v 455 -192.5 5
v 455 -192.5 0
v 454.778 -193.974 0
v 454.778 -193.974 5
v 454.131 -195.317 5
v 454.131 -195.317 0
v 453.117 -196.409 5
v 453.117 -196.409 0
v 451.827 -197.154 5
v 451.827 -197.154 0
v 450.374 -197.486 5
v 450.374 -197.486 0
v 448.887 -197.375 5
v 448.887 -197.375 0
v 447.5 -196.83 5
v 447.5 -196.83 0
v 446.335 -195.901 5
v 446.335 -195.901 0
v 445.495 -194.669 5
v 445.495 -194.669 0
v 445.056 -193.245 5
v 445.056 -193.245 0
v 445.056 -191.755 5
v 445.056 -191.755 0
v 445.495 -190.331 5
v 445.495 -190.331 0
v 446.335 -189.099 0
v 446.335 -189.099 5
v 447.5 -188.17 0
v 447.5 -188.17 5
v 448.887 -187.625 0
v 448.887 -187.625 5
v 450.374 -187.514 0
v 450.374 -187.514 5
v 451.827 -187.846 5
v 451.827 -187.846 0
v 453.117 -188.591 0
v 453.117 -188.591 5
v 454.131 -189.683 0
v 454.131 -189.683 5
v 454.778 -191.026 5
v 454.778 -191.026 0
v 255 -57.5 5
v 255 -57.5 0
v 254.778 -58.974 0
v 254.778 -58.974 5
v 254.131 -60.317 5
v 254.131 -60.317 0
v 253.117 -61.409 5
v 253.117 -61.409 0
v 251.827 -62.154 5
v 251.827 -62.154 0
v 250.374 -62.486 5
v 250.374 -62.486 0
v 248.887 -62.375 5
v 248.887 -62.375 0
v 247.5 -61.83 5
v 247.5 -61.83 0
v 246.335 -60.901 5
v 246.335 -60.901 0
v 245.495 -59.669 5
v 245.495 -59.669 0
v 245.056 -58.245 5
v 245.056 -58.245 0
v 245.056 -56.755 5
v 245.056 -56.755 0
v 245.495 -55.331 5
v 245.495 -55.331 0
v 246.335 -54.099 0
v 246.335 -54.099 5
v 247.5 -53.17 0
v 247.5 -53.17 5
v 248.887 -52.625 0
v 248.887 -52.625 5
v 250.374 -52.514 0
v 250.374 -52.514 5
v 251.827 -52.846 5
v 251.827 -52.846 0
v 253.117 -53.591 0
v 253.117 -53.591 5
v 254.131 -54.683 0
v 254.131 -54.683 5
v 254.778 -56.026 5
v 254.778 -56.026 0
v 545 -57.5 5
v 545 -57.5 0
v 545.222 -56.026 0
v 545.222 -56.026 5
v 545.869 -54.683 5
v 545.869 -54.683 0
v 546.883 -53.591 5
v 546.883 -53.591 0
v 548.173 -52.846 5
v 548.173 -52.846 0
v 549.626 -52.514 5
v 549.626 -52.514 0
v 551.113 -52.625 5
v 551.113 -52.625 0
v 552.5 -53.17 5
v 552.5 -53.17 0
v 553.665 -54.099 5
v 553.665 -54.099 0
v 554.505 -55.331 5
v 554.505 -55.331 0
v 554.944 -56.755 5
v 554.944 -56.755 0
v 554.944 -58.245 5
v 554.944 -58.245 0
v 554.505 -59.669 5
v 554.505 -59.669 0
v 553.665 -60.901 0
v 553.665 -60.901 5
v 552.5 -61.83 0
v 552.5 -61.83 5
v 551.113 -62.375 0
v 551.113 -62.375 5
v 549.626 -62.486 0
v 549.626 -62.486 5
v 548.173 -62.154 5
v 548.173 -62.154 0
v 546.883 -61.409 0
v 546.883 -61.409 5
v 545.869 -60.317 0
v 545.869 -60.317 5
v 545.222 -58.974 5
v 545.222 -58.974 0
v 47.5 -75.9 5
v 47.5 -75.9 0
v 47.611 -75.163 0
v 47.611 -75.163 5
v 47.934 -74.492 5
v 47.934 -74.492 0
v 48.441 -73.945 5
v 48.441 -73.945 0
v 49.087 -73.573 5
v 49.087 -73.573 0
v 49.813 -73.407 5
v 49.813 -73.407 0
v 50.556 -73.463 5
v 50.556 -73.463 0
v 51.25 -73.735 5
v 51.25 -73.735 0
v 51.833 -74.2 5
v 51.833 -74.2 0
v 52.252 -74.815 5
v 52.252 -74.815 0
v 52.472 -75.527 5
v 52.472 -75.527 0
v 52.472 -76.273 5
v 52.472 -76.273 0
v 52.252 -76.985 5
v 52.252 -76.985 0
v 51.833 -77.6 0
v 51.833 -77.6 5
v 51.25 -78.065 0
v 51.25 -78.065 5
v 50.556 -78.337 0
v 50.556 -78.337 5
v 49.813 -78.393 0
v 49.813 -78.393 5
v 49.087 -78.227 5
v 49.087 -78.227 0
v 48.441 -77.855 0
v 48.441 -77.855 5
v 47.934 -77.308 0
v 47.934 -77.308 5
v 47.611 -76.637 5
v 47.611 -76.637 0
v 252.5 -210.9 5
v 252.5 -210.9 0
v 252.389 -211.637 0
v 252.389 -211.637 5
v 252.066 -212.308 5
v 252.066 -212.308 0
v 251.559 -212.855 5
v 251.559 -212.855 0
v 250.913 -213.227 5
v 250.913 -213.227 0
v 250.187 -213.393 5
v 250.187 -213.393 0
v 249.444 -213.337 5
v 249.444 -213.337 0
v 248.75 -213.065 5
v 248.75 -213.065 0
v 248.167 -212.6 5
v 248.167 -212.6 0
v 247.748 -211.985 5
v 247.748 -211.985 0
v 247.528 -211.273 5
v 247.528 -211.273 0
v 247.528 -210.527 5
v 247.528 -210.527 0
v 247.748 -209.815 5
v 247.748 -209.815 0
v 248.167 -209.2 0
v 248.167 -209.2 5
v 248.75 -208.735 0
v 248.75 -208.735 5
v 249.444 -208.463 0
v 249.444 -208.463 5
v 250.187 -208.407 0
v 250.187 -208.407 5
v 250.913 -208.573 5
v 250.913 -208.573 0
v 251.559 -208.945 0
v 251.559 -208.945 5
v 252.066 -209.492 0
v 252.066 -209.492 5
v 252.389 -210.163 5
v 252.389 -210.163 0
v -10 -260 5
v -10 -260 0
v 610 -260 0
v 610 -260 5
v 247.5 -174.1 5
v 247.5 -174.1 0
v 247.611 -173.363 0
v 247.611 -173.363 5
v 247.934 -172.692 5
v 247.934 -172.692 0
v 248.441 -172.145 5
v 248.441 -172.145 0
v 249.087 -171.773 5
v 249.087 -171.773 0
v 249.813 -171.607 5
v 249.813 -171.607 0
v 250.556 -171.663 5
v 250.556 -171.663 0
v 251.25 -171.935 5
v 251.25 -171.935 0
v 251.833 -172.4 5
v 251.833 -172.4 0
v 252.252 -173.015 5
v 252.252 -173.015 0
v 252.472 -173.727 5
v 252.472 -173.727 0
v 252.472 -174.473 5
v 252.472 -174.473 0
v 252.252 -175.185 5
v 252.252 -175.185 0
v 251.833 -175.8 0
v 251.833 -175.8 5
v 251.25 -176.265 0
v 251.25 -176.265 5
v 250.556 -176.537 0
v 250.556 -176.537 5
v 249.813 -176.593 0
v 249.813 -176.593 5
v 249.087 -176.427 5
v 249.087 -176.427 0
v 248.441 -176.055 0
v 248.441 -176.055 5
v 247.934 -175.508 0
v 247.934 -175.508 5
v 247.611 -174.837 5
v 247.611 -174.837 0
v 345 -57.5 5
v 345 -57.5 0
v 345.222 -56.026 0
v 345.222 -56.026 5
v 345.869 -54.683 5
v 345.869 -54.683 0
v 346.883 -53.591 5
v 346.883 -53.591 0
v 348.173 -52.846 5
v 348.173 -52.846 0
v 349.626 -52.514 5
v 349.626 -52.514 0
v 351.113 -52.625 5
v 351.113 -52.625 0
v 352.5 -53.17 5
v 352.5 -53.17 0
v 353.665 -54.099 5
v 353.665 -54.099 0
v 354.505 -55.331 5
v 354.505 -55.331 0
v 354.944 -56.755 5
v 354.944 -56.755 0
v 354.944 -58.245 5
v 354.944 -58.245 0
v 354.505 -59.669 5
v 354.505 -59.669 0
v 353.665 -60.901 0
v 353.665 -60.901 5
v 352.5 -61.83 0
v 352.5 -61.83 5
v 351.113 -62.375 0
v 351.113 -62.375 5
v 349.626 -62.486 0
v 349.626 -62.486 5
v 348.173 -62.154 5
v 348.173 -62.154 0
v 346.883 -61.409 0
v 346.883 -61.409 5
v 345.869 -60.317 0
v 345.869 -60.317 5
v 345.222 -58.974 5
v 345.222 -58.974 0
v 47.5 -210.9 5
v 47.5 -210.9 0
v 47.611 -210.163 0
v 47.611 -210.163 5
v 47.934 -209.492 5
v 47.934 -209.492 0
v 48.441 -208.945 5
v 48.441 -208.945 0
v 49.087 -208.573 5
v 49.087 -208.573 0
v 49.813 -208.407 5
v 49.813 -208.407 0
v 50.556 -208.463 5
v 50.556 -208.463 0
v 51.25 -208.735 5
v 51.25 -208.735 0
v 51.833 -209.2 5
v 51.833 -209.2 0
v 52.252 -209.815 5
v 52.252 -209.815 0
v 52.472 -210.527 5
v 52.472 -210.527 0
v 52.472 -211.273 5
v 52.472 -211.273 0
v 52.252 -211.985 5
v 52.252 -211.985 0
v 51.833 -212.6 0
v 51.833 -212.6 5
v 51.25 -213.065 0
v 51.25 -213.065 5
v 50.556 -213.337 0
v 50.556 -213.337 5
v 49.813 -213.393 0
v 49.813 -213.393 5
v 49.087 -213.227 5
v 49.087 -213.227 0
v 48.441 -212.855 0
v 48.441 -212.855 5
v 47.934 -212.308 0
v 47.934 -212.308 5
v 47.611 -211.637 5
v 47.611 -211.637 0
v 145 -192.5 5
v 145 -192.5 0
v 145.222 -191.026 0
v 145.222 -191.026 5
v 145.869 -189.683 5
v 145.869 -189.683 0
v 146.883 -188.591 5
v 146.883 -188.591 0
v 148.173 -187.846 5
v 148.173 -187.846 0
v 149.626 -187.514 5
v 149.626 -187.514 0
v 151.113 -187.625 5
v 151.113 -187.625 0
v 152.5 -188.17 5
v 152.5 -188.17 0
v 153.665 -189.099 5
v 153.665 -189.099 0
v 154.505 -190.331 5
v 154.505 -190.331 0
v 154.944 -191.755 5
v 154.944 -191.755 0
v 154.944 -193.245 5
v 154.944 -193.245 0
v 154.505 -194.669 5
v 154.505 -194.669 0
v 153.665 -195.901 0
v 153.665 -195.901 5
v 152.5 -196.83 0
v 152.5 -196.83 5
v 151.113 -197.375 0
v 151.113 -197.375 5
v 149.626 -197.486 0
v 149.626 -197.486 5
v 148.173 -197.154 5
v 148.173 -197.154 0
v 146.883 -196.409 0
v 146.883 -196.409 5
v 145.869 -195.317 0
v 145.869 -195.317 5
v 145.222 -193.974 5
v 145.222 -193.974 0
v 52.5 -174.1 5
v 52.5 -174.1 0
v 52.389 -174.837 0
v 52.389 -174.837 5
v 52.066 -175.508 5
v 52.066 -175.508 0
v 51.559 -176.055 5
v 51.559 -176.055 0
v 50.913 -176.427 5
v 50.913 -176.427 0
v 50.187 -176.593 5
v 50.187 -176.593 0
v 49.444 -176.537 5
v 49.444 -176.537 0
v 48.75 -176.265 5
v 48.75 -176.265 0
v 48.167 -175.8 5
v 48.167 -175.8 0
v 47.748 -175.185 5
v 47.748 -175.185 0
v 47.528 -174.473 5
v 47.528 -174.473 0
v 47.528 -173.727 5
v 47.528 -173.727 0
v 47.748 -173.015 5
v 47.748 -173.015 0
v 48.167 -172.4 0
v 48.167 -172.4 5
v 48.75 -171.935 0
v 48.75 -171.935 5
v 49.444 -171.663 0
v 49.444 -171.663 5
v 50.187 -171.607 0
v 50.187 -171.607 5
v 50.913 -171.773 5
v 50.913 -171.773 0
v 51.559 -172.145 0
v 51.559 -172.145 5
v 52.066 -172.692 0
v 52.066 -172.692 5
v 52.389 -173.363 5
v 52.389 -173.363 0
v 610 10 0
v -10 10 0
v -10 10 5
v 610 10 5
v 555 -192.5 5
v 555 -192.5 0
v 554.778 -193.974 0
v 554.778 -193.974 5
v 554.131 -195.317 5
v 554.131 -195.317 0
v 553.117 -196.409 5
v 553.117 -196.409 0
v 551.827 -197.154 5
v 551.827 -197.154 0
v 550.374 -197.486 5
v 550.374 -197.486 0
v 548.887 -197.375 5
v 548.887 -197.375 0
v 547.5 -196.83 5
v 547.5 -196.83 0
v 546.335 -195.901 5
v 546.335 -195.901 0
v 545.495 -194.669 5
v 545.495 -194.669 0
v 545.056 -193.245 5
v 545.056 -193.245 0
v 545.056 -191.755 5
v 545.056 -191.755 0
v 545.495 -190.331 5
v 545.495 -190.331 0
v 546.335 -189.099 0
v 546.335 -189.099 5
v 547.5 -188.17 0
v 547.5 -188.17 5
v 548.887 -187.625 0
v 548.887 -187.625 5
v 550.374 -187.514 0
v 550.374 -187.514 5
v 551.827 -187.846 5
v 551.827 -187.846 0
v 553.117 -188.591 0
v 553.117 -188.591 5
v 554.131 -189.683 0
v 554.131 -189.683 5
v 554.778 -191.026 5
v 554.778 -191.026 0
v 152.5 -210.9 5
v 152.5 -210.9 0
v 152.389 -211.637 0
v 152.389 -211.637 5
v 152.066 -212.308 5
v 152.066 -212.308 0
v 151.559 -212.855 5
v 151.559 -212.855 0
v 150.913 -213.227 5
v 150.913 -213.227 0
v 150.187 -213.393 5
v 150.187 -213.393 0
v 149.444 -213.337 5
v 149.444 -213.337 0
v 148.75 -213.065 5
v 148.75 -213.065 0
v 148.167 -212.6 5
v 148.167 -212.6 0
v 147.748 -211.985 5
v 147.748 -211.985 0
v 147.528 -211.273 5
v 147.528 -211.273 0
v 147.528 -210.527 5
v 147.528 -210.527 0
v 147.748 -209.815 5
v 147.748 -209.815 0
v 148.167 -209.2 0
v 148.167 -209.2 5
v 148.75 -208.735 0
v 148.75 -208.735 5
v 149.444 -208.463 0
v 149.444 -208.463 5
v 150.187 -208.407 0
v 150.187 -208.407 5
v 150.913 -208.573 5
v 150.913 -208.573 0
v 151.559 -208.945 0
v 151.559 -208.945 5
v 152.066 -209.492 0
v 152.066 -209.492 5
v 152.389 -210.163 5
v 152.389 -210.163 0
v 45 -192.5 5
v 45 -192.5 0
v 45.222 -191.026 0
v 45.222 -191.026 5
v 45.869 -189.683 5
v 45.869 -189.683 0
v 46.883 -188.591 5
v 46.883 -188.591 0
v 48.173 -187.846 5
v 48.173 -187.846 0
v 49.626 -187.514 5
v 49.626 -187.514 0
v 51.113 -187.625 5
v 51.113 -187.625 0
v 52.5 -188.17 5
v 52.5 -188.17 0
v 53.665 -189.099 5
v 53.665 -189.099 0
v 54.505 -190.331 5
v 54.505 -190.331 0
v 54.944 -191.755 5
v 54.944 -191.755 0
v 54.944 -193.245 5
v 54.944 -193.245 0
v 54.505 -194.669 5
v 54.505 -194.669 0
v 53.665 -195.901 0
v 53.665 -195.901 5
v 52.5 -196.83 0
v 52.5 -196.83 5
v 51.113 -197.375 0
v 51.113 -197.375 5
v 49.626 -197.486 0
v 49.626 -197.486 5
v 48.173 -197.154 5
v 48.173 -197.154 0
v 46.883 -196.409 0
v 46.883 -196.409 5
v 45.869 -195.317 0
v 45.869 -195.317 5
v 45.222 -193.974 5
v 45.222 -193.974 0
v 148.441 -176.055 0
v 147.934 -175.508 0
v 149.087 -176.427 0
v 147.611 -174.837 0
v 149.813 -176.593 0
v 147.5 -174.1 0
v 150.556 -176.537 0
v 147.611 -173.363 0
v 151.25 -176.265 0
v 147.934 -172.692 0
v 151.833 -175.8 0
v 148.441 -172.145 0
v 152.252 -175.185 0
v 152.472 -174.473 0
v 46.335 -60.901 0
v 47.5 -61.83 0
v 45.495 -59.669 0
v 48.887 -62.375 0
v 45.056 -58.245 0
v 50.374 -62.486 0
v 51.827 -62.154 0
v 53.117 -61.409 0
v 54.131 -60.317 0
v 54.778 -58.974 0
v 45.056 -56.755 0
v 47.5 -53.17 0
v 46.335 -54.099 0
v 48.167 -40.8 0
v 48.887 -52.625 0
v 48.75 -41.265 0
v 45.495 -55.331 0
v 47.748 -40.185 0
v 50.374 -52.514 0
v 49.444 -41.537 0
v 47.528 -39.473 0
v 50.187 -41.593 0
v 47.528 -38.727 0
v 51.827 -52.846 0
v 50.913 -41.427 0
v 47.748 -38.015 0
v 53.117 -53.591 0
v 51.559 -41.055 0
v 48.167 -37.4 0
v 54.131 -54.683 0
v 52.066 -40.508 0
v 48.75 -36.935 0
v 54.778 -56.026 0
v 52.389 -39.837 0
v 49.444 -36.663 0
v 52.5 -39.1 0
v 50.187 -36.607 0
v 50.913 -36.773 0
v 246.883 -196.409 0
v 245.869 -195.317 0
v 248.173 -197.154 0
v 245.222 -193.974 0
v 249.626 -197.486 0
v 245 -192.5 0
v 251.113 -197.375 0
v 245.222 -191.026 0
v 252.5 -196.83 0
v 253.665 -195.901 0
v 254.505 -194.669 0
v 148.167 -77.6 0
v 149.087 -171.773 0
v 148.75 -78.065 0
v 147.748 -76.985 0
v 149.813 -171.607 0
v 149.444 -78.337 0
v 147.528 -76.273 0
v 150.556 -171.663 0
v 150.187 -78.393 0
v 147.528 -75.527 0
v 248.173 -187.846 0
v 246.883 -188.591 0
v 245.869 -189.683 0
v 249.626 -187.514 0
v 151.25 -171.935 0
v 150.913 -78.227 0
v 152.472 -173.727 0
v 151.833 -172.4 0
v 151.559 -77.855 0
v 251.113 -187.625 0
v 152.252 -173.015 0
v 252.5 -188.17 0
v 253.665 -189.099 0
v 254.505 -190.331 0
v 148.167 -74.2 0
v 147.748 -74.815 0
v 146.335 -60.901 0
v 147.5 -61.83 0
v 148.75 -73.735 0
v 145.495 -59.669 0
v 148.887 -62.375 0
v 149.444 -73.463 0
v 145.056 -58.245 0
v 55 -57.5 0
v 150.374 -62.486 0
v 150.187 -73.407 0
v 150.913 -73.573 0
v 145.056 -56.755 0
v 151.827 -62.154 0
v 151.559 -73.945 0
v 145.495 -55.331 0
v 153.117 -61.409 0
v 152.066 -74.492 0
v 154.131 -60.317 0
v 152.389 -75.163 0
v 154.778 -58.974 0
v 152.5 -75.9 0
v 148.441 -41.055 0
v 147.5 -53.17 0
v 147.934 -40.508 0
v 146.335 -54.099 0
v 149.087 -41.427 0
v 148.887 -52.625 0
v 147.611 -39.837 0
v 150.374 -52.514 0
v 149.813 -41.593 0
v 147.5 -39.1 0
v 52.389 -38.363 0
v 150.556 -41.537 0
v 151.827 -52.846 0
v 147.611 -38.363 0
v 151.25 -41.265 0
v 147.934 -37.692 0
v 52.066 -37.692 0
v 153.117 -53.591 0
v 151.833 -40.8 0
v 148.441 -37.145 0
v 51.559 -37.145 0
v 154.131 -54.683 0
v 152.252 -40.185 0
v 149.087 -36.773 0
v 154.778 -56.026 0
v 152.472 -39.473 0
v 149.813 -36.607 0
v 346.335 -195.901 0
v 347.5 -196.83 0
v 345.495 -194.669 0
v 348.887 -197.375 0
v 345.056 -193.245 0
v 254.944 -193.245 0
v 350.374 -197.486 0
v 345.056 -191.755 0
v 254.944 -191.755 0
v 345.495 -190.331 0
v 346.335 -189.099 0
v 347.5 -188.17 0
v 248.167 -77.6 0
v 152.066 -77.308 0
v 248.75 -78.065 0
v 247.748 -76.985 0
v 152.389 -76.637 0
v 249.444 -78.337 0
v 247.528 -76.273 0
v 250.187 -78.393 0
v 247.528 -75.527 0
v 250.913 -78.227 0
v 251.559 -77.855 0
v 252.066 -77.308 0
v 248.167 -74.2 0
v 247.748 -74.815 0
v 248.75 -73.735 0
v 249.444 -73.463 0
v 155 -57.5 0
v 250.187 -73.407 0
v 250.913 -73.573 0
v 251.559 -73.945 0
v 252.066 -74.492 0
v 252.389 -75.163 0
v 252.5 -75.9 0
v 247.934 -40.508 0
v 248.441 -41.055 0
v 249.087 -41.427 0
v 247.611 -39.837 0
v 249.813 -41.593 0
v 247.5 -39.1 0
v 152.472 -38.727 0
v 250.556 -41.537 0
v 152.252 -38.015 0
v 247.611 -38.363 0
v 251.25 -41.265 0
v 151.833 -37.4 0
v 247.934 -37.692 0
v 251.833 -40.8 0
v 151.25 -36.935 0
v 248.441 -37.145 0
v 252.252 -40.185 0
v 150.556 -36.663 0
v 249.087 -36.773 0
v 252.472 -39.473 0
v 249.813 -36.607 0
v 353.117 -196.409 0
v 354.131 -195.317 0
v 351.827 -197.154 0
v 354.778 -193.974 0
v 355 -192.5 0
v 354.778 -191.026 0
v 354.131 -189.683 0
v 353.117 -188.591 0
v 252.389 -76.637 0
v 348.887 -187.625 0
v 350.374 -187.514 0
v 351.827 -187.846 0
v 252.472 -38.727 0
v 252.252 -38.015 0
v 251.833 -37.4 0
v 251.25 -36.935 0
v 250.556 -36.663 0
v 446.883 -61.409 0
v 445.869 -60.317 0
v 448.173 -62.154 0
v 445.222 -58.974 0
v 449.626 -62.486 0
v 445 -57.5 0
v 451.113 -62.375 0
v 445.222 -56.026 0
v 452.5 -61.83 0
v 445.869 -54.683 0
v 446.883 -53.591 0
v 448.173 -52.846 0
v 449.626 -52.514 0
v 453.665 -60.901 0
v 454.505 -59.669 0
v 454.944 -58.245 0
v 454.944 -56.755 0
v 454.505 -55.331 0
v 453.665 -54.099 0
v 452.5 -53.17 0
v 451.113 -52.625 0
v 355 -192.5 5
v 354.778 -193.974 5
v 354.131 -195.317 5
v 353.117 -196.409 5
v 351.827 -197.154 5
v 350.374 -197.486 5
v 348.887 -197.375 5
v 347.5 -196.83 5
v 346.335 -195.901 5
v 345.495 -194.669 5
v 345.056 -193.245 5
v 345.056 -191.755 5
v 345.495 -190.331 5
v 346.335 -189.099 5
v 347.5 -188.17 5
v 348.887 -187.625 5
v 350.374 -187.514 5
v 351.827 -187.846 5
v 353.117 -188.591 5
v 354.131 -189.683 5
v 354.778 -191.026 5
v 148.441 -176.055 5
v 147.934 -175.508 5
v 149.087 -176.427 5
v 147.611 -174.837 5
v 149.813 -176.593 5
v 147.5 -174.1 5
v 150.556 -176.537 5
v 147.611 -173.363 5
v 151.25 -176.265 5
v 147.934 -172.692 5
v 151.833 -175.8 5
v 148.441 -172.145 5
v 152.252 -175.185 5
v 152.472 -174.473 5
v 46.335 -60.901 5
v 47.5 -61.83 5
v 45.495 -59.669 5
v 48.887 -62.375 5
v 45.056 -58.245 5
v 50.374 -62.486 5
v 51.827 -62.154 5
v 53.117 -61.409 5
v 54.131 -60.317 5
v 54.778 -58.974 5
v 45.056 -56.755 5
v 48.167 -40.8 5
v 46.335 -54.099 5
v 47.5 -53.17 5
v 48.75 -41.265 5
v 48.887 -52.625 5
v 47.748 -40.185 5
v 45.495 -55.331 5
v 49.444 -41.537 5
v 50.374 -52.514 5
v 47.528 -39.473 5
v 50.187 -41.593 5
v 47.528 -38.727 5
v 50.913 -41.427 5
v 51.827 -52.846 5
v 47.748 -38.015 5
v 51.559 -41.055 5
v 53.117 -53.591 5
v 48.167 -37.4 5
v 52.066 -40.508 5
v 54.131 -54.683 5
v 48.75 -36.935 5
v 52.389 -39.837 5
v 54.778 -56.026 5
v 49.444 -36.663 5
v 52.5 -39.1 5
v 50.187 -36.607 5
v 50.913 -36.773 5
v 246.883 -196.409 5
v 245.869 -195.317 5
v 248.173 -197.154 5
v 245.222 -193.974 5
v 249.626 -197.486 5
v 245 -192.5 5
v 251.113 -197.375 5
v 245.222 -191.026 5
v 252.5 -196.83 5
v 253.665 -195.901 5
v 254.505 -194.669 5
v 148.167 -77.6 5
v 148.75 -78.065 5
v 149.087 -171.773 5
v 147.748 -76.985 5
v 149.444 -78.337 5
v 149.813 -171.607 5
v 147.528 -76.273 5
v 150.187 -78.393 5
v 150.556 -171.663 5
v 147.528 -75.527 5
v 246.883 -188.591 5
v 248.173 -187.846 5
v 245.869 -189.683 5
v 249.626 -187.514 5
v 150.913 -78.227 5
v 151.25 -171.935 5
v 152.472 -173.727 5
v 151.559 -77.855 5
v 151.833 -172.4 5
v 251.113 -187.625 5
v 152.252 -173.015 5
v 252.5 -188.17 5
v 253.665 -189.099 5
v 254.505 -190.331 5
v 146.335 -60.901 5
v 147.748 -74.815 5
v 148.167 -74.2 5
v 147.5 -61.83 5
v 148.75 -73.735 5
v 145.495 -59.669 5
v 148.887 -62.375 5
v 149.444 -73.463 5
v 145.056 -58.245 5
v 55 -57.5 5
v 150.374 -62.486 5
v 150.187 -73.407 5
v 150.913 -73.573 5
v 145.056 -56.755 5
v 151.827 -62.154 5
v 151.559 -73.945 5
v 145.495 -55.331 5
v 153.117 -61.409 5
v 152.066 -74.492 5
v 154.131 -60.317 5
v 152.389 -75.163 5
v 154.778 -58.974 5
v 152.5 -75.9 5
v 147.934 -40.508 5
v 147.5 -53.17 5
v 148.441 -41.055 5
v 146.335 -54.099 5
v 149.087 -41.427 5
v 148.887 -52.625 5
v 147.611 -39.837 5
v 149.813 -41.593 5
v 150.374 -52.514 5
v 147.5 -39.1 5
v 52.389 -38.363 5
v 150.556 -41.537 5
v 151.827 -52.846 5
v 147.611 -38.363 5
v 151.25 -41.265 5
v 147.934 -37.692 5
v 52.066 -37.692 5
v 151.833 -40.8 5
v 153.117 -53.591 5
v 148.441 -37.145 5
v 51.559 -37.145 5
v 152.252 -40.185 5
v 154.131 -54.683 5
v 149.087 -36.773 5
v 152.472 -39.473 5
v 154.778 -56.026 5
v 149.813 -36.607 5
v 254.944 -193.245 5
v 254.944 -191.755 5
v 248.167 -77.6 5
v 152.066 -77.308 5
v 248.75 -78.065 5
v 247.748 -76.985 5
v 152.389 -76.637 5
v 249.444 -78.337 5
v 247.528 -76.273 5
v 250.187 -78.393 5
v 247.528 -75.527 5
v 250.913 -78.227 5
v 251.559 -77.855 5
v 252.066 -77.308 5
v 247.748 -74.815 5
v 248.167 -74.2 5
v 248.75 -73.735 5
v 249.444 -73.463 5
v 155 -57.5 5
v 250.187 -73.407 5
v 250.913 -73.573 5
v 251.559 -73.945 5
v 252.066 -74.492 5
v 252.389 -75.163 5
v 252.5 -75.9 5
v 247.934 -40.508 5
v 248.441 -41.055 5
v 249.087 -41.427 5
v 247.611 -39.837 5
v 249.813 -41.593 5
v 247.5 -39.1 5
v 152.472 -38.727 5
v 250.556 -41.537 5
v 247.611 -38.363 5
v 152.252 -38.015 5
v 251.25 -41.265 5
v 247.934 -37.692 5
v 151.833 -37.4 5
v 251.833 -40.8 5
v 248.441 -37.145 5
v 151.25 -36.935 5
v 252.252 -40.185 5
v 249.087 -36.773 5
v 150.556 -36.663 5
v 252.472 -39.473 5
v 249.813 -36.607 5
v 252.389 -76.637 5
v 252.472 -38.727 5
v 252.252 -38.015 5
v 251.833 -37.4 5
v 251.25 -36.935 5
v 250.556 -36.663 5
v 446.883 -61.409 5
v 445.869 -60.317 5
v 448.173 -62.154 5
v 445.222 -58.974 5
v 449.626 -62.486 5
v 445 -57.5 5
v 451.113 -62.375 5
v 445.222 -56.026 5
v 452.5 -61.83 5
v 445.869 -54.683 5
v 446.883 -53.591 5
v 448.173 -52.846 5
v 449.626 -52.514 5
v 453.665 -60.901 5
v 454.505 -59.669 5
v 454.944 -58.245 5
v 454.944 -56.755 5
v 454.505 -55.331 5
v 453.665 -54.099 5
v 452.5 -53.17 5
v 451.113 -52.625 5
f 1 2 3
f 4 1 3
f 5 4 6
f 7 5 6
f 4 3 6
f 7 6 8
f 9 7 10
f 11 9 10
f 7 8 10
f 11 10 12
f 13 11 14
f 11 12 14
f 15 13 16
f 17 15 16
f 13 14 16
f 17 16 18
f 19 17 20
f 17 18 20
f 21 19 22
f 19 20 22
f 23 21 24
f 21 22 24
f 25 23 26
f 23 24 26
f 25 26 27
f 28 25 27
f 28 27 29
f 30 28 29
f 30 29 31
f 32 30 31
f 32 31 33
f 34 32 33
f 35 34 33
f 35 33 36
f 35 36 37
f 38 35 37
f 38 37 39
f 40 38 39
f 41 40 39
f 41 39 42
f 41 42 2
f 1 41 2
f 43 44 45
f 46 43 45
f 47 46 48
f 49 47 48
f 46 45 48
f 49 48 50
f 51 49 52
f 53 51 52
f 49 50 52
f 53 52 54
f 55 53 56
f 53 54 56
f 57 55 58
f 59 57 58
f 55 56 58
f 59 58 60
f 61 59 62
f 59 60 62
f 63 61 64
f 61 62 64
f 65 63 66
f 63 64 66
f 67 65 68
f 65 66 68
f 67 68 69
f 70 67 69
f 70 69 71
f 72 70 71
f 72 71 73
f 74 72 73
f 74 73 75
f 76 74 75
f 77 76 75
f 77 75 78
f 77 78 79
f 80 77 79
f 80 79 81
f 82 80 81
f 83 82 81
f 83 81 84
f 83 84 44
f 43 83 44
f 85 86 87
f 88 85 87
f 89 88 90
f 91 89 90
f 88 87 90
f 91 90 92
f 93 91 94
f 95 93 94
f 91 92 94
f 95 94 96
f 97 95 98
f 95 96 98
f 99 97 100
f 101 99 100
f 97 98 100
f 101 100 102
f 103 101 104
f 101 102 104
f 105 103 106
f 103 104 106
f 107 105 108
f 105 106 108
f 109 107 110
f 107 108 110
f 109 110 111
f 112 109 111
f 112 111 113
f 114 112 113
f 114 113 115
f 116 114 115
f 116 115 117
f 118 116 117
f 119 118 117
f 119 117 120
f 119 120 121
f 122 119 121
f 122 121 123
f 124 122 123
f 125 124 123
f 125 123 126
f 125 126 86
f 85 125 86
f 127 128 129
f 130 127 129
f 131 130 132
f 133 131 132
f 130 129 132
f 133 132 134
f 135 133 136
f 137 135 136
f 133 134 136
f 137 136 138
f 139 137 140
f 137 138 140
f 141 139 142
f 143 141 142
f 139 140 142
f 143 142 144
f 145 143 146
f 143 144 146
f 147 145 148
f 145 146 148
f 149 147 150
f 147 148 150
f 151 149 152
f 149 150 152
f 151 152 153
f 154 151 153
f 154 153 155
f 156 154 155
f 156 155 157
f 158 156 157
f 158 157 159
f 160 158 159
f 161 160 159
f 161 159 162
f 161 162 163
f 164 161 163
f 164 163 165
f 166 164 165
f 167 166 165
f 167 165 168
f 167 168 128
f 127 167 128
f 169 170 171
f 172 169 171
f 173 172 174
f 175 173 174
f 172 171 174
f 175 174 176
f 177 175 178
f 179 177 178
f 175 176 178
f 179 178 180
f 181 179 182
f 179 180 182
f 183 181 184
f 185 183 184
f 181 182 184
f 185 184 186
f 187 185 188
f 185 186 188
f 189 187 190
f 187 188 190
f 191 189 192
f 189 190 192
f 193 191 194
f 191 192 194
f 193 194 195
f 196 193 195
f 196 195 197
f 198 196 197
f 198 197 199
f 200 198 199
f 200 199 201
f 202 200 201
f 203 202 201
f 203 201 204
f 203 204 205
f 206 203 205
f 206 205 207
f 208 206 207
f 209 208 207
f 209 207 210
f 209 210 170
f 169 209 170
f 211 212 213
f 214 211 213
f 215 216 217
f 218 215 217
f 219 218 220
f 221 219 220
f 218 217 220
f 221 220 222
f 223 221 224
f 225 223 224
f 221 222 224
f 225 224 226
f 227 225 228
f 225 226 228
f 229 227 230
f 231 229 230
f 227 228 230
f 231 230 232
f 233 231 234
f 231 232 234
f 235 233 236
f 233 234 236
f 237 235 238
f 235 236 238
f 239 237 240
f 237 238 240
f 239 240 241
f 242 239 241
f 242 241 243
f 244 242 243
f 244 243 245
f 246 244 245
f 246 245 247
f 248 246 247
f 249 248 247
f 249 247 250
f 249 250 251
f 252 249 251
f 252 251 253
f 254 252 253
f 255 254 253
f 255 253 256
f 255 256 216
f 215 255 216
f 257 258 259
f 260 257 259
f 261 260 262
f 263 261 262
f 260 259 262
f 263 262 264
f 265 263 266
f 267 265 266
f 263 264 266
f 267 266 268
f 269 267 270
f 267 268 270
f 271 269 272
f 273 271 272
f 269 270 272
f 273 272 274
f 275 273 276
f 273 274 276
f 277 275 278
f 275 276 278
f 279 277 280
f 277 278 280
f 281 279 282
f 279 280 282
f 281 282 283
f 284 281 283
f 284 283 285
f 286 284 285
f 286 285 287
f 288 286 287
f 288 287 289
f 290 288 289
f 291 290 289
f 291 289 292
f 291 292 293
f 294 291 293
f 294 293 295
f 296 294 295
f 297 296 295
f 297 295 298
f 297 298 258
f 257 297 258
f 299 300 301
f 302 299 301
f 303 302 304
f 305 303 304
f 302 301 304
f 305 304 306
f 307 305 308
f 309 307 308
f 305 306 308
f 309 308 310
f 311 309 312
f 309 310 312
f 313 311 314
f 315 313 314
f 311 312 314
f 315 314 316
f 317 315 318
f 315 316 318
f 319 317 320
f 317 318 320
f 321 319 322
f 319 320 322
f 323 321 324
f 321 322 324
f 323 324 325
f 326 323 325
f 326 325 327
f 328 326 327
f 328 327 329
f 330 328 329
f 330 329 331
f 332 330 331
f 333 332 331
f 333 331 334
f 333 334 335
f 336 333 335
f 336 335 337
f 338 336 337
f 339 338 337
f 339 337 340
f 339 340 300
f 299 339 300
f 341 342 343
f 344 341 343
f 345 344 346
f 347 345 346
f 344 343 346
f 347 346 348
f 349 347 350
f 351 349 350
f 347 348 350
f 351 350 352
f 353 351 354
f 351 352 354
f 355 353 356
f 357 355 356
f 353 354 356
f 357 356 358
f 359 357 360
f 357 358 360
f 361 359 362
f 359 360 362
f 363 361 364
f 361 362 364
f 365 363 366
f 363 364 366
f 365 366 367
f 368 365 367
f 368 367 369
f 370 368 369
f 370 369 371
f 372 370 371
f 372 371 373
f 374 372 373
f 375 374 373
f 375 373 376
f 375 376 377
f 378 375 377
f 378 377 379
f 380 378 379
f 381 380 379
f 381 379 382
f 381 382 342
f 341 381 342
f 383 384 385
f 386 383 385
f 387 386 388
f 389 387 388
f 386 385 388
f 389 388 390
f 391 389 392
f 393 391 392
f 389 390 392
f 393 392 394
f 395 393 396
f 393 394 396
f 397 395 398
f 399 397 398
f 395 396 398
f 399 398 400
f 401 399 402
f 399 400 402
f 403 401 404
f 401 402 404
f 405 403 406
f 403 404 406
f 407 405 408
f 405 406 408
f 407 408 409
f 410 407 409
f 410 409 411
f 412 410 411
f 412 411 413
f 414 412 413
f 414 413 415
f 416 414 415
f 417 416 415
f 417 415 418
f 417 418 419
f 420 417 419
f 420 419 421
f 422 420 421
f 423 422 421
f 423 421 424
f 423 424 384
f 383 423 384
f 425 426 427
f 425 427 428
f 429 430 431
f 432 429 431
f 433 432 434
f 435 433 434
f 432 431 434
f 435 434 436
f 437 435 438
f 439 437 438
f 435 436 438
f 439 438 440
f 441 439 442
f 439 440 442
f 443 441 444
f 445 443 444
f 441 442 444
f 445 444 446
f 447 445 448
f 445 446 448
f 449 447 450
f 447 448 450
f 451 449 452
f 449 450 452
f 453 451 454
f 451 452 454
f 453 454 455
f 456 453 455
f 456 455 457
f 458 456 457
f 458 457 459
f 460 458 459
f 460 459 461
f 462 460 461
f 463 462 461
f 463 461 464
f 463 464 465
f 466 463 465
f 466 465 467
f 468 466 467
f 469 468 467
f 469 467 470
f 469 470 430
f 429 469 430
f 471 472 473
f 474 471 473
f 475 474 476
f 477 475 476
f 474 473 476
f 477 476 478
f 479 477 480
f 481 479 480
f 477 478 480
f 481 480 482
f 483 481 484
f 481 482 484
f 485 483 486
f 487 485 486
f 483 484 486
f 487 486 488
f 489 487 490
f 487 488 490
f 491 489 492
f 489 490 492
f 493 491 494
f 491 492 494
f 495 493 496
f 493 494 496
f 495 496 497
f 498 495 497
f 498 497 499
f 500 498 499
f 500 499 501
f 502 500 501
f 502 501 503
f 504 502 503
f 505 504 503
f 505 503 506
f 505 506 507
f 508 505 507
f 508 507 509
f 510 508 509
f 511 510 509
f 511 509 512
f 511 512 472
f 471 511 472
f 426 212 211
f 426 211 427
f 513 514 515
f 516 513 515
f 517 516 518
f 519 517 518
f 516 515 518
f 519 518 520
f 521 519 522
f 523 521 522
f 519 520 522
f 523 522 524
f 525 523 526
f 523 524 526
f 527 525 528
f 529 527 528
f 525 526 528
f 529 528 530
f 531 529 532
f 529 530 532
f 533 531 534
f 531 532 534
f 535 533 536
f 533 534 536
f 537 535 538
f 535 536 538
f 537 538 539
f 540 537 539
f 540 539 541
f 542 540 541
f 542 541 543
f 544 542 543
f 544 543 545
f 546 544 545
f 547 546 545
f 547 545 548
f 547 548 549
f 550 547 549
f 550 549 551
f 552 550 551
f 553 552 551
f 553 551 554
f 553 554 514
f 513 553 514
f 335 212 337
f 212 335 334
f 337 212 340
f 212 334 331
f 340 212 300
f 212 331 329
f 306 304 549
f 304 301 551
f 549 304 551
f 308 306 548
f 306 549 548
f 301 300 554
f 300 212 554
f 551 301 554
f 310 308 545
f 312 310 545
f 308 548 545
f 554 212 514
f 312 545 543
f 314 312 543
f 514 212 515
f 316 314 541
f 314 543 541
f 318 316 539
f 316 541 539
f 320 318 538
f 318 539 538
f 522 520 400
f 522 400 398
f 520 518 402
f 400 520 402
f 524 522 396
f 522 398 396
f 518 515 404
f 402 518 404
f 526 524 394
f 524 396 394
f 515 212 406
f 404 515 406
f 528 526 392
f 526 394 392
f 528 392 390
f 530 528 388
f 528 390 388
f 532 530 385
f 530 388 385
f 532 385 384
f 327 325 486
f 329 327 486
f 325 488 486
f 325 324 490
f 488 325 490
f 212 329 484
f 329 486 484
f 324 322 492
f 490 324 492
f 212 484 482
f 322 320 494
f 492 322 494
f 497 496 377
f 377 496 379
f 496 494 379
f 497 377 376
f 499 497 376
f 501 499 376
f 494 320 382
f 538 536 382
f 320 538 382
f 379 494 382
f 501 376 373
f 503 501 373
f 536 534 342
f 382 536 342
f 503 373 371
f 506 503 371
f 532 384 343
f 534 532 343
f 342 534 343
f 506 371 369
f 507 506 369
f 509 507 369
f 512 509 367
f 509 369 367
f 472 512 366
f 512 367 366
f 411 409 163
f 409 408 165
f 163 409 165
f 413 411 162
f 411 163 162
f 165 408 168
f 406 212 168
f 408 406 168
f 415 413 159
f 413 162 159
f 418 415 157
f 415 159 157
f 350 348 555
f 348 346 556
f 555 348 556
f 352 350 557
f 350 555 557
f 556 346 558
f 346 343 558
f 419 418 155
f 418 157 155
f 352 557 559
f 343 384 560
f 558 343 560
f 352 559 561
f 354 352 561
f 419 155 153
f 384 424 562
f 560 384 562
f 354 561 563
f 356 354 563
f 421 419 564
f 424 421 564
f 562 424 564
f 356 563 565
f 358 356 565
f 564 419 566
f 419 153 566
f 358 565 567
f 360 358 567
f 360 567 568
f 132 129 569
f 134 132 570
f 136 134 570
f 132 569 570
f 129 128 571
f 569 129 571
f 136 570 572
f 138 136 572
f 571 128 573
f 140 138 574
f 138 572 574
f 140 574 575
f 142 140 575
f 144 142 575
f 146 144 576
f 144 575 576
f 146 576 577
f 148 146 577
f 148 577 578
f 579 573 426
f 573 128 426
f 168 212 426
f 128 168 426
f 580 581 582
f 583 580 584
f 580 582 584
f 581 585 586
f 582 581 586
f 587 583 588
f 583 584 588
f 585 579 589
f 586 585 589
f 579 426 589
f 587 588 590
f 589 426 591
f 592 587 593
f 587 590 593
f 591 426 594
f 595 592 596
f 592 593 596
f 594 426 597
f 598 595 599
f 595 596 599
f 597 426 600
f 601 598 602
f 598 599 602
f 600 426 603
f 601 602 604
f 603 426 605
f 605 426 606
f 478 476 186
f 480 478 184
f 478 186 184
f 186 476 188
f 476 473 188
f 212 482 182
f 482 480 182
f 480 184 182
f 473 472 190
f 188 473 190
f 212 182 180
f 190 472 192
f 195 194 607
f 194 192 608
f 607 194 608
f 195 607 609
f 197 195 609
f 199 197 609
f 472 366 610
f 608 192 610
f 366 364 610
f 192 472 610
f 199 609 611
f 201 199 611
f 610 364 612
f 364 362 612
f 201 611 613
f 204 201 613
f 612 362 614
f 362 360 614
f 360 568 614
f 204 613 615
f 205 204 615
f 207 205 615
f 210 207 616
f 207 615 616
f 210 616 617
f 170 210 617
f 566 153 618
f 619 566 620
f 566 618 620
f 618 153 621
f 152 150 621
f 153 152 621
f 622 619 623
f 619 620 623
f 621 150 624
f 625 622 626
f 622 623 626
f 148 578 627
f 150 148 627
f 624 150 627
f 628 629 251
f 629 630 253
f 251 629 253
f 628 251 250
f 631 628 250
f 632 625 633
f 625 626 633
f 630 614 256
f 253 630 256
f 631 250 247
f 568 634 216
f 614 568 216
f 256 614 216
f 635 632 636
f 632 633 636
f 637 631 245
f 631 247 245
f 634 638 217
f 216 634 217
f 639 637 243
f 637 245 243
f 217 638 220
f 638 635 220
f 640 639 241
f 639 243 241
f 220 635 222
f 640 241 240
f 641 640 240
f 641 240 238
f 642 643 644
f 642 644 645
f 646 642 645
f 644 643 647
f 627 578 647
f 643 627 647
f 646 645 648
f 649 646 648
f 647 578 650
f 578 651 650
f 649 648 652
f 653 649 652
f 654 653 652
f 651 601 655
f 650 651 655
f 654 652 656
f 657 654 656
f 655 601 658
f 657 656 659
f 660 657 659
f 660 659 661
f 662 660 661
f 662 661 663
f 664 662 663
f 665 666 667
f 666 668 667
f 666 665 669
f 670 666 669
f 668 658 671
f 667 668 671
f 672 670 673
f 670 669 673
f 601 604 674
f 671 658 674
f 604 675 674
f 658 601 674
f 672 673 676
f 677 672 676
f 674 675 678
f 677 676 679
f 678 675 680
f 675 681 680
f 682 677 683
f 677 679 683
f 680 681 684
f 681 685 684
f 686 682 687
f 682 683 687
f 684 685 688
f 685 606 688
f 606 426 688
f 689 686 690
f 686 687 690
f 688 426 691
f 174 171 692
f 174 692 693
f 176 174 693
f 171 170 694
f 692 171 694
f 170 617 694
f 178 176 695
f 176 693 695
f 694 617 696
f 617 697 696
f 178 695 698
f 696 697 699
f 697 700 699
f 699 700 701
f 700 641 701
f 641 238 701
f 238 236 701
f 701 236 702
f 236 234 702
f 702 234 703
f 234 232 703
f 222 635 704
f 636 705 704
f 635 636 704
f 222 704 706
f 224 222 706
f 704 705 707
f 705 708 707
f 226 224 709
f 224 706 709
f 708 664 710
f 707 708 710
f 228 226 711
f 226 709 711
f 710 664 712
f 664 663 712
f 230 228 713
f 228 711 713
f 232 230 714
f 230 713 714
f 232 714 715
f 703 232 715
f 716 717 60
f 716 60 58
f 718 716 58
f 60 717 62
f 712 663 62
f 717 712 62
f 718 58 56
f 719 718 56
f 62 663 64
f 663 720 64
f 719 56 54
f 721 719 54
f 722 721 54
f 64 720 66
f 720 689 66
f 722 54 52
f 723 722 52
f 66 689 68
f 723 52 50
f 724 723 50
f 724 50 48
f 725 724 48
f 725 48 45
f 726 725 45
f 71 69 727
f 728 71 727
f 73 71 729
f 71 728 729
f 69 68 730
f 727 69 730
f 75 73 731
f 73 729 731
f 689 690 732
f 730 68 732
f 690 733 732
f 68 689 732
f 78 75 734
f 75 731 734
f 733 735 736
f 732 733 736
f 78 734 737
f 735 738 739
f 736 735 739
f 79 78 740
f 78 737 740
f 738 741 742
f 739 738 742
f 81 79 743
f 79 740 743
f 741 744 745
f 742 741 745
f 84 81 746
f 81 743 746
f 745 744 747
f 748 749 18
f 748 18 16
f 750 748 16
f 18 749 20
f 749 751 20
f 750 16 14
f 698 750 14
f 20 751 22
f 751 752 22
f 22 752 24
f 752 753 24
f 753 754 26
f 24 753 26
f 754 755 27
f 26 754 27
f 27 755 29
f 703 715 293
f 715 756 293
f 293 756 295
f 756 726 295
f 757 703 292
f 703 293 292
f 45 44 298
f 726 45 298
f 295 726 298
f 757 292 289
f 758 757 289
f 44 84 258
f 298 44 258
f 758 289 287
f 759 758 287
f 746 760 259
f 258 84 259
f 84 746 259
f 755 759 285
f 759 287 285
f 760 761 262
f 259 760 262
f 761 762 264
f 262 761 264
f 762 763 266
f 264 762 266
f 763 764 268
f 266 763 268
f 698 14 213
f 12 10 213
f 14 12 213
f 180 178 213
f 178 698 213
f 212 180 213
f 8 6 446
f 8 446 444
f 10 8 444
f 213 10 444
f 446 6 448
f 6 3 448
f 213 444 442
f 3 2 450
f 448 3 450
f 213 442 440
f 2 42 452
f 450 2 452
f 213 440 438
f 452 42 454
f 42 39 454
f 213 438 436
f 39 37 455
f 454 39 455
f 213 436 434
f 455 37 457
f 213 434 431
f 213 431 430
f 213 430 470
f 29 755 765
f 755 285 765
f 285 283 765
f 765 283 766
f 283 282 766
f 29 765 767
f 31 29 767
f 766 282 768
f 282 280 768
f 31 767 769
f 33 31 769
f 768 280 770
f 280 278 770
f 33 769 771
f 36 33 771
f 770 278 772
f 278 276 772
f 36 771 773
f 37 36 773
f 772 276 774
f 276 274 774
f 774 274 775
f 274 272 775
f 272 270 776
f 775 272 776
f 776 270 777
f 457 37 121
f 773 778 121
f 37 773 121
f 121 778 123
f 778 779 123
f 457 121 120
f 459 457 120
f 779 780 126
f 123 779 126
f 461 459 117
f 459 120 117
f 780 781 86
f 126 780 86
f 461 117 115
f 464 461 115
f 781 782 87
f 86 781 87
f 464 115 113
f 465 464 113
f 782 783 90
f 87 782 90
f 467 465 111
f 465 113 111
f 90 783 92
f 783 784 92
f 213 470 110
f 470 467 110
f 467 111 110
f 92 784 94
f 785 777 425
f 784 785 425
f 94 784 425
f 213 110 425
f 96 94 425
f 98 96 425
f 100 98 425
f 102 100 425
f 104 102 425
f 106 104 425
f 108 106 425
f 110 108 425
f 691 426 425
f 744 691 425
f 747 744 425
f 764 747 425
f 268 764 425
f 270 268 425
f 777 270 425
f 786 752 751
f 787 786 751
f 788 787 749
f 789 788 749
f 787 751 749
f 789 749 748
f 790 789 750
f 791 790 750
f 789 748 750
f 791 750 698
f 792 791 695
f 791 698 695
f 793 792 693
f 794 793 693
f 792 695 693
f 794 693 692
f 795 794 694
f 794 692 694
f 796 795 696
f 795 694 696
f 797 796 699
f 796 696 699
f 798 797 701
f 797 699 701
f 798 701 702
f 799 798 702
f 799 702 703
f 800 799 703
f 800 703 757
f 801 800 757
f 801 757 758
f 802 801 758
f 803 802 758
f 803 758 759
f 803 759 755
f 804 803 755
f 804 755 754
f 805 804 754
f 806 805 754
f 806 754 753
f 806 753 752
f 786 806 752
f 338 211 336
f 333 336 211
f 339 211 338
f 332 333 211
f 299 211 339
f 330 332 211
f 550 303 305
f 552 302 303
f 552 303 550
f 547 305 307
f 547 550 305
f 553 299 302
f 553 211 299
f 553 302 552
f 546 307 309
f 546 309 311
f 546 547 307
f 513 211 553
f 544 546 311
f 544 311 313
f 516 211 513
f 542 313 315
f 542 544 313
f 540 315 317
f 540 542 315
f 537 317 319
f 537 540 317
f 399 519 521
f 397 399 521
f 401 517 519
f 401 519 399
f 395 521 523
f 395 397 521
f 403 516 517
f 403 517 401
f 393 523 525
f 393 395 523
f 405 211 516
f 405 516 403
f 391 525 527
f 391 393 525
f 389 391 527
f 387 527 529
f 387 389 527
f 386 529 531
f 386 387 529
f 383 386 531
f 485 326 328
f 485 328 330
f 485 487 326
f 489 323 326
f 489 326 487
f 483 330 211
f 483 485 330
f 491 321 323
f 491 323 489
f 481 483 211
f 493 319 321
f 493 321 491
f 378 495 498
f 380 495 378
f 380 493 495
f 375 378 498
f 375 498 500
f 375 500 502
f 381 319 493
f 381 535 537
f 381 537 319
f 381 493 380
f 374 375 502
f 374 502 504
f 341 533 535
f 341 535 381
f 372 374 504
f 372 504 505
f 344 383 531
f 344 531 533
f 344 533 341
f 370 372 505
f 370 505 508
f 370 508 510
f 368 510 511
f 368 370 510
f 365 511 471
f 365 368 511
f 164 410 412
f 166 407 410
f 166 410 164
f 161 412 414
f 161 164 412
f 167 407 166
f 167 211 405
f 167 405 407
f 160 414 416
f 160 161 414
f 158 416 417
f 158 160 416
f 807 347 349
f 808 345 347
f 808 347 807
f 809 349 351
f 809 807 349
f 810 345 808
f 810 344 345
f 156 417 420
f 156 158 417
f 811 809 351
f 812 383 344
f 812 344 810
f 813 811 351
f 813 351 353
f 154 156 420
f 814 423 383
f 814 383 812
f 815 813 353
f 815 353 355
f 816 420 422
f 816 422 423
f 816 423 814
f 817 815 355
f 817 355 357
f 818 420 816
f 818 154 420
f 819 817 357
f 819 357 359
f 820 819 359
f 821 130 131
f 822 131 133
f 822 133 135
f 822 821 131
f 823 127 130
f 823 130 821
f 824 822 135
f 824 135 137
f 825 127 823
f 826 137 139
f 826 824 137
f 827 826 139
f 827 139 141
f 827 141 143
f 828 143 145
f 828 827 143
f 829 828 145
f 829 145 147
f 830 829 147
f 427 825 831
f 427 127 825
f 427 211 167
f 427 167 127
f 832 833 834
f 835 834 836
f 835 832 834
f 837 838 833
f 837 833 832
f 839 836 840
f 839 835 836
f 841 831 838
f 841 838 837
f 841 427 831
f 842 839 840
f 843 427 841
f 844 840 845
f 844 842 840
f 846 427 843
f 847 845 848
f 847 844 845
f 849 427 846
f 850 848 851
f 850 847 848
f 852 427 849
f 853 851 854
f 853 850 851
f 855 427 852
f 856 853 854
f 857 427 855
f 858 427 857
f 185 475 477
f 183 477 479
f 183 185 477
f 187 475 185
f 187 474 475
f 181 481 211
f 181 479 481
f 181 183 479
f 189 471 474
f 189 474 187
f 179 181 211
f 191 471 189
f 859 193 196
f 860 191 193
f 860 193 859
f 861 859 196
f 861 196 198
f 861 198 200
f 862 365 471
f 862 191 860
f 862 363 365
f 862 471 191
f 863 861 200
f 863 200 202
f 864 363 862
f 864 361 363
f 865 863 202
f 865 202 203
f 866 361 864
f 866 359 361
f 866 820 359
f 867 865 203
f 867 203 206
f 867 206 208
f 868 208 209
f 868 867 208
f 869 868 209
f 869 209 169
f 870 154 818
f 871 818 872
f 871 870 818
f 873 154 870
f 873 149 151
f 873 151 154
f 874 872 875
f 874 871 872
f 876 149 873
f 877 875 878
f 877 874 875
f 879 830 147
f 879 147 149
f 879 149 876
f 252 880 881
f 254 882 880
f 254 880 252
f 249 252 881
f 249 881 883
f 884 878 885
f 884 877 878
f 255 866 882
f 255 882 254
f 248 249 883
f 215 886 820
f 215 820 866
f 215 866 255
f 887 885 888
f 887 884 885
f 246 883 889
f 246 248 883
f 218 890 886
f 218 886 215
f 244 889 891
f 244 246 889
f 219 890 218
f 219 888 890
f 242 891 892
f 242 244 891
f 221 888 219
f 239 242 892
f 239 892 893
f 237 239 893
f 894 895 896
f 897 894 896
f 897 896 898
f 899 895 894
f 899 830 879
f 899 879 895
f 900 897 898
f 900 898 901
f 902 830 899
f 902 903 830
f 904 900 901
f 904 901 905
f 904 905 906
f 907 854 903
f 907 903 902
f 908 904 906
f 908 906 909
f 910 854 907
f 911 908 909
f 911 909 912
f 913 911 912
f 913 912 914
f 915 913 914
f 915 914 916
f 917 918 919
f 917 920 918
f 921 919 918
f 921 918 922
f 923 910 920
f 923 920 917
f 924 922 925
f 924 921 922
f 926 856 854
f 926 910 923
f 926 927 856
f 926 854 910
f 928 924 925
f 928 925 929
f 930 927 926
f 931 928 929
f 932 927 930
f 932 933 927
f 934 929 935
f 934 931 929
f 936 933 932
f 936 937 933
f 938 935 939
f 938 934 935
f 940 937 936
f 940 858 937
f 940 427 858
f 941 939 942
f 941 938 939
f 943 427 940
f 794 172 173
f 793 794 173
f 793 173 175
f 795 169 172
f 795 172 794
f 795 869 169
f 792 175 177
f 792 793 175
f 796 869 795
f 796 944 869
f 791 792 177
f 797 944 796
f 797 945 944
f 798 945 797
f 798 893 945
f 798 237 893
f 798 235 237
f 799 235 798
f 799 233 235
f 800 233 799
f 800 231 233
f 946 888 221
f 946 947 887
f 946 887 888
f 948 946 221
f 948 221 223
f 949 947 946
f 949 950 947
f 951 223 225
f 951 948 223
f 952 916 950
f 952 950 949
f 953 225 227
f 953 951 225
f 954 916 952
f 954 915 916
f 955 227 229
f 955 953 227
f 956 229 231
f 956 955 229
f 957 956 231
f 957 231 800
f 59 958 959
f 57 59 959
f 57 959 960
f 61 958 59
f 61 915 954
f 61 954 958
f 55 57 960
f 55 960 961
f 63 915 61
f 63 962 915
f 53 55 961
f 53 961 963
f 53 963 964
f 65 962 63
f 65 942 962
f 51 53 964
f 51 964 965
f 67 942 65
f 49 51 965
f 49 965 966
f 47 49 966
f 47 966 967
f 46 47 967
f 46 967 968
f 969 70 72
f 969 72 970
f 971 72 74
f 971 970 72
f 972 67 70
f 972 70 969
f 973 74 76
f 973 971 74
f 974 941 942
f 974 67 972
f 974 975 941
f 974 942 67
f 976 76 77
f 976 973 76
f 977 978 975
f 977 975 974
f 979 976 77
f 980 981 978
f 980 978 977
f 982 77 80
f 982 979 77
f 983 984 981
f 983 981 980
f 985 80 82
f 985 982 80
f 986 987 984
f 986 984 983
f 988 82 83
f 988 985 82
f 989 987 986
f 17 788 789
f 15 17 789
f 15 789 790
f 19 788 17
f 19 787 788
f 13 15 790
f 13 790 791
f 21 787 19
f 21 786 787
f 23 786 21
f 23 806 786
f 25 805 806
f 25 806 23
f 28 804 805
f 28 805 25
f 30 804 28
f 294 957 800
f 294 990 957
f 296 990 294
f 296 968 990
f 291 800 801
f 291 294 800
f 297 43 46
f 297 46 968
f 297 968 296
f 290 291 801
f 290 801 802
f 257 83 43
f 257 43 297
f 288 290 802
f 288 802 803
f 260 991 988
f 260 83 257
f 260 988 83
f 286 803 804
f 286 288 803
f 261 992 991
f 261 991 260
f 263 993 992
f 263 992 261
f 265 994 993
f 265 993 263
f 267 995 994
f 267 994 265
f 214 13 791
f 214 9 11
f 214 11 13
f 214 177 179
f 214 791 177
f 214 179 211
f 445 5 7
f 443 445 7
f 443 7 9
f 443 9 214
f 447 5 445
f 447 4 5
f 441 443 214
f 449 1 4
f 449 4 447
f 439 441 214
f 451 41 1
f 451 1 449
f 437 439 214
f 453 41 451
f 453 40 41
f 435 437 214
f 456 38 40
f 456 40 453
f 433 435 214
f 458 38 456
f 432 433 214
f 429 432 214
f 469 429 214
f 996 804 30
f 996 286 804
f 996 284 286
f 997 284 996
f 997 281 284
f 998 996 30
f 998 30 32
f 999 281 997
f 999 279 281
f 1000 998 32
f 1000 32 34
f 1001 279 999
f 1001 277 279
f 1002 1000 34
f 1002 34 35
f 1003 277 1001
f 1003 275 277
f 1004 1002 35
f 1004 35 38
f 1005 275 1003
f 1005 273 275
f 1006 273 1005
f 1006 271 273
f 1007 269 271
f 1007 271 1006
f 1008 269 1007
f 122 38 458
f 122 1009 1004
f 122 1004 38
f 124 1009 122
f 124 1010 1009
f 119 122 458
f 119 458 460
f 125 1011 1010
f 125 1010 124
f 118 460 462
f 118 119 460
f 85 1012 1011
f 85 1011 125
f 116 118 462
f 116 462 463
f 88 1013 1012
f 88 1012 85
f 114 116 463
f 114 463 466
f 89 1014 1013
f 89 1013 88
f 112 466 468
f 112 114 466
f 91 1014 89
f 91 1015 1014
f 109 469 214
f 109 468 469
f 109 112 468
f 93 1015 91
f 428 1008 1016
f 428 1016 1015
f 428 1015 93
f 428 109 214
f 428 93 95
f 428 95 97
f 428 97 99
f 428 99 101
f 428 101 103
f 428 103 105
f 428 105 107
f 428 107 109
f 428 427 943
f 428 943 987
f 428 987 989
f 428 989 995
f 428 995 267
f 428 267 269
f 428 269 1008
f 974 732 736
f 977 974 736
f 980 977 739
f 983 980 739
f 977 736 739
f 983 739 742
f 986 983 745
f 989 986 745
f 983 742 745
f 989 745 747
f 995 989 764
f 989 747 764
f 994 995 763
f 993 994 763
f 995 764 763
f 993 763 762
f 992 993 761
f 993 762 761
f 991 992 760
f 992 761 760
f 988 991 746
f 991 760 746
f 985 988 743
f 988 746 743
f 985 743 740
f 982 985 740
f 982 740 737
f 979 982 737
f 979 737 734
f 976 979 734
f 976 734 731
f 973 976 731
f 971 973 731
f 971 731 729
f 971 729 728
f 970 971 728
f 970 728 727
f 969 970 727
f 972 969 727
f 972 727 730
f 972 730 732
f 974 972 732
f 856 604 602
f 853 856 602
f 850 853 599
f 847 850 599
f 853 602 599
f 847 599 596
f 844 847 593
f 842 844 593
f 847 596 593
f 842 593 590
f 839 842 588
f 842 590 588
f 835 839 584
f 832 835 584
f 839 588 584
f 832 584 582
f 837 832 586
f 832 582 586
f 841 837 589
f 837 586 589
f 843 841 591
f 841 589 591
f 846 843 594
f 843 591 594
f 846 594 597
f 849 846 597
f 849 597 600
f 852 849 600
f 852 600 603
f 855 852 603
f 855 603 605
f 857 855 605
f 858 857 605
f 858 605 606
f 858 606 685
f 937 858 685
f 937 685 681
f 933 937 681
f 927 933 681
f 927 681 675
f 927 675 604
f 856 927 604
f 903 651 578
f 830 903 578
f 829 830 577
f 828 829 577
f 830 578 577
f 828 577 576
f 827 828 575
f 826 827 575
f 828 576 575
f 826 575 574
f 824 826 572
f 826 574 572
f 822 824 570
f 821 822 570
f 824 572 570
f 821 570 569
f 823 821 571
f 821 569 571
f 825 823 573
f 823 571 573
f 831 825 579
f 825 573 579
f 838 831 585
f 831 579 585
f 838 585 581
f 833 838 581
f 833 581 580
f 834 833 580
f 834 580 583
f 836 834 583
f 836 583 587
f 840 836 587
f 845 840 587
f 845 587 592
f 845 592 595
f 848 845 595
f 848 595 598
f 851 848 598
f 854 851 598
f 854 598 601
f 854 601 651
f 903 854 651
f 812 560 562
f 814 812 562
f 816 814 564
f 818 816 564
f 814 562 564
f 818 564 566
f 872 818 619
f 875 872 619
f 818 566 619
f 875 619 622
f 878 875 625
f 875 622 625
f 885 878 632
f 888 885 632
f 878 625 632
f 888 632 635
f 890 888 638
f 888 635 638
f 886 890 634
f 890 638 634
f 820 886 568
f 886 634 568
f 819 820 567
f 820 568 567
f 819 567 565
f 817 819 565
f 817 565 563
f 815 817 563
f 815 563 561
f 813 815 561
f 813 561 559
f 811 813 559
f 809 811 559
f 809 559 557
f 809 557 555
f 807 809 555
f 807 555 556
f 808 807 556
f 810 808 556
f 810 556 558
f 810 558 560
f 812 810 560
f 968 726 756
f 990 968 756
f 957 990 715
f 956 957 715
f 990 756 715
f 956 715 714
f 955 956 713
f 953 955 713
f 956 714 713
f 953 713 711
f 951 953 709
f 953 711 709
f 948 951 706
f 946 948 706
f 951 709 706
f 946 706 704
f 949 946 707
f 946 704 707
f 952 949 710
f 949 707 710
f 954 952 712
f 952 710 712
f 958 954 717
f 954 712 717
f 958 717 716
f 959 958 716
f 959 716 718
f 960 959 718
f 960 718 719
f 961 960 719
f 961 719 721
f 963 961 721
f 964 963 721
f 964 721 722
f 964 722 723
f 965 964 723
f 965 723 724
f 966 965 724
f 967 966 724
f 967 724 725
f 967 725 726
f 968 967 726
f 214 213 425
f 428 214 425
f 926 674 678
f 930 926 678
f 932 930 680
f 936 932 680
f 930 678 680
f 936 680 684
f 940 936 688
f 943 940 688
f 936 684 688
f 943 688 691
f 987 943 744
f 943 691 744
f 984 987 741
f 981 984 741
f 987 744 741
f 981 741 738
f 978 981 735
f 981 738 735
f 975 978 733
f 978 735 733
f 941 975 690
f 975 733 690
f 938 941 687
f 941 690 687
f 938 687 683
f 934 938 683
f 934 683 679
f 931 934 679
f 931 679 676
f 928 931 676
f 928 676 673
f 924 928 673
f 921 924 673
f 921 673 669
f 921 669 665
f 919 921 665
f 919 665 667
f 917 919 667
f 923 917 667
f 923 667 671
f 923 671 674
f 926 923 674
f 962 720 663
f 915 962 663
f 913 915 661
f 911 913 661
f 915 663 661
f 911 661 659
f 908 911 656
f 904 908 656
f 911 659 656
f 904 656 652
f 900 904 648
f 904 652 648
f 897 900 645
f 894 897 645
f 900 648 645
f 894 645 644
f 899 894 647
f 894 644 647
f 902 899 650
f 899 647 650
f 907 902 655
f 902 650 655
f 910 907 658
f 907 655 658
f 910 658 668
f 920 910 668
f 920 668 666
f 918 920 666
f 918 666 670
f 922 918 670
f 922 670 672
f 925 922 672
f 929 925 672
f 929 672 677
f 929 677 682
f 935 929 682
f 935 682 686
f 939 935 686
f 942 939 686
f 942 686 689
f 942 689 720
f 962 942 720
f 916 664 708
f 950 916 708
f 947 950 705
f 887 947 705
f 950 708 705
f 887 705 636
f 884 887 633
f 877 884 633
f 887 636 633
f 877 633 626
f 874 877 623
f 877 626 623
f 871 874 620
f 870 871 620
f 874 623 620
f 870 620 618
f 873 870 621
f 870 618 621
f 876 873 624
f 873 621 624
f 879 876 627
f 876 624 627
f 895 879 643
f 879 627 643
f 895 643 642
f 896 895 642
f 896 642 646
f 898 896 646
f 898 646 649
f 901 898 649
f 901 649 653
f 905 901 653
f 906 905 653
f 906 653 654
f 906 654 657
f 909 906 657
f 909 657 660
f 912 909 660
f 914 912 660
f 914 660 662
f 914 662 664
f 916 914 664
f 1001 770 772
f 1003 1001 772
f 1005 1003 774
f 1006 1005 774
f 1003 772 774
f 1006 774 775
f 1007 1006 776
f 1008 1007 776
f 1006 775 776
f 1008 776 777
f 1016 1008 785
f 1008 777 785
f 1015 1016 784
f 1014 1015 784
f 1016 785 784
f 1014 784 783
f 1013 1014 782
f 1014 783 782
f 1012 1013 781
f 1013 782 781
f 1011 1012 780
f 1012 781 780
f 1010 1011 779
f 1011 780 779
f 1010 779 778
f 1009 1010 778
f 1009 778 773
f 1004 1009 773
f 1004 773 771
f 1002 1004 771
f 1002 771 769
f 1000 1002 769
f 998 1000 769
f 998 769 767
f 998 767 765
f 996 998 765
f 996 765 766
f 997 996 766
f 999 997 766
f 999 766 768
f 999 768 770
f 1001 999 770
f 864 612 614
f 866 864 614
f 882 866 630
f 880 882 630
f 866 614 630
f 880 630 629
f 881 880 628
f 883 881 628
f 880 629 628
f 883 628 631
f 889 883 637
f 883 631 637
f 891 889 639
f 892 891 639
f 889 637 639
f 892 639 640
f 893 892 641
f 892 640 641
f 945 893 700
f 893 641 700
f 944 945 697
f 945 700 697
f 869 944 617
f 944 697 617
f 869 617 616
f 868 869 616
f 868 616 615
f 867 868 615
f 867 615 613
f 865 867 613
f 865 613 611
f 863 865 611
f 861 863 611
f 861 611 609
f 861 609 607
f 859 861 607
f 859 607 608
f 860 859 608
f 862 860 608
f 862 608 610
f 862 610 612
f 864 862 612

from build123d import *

# Parameters (mm, degrees)
SKETCH_1_W          = 620
SKETCH_1_H          = 270
EXTRUDE_1_DEPTH     = 5
SKETCH_2_R          = 5
SKETCH_2_R_2        = 2.5
CUT_EXTRUDE_1_DEPTH = 664.117636623


with BuildPart() as part:
    # 草图1 → 凸台-拉伸1 (new body)
    with BuildSketch(Plane.XY):
        with Locations((300, -125)):
            Rectangle(SKETCH_1_W, SKETCH_1_H)
    extrude(amount=EXTRUDE_1_DEPTH)

    # 草图2 → 切除-拉伸1 (cut, through all)
    with BuildSketch(Plane(origin=(0, 0, 0), x_dir=(-1, 0, 0), z_dir=(0, 0, -1))):
        with Locations((-50, -192.5)):
            Circle(SKETCH_2_R)
        with Locations((-150, -192.5)):
            Circle(SKETCH_2_R)
        with Locations((-250, -192.5)):
            Circle(SKETCH_2_R)
        with Locations(Location((-350, -192.5, 0), (0, 0, 180))):
            Circle(SKETCH_2_R)
        with Locations(Location((-450, -192.5, 0), (0, 0, 180))):
            Circle(SKETCH_2_R)
        with Locations(Location((-550, -192.5, 0), (0, 0, 180))):
            Circle(SKETCH_2_R)
        with Locations((-550, -57.5)):
            Circle(SKETCH_2_R)
        with Locations((-450, -57.5)):
            Circle(SKETCH_2_R)
        with Locations((-350, -57.5)):
            Circle(SKETCH_2_R)
        with Locations(Location((-250, -57.5, 0), (0, 0, 180))):
            Circle(SKETCH_2_R)
        with Locations(Location((-150, -57.5, 0), (0, 0, 180))):
            Circle(SKETCH_2_R)
        with Locations(Location((-50, -57.5, 0), (0, 0, 180))):
            Circle(SKETCH_2_R)
        with Locations((-50, -75.9)):
            Circle(SKETCH_2_R_2)
        with Locations(Location((-50, -39.1, 0), (0, 0, 180))):
            Circle(SKETCH_2_R_2)
        with Locations((-50, -210.9)):
            Circle(SKETCH_2_R_2)
        with Locations(Location((-50, -174.1, 0), (0, 0, 180))):
            Circle(SKETCH_2_R_2)
        with Locations(Location((-250, -210.9, 0), (0, 0, 180))):
            Circle(SKETCH_2_R_2)
        with Locations((-250, -174.1)):
            Circle(SKETCH_2_R_2)
        with Locations(Location((-250, -75.9, 0), (0, 0, 180))):
            Circle(SKETCH_2_R_2)
        with Locations((-250, -39.1)):
            Circle(SKETCH_2_R_2)
        with Locations(Location((-150, -75.9, 0), (0, 0, 180))):
            Circle(SKETCH_2_R_2)
        with Locations((-150, -39.1)):
            Circle(SKETCH_2_R_2)
        with Locations(Location((-150, -210.9, 0), (0, 0, 180))):
            Circle(SKETCH_2_R_2)
        with Locations((-150, -174.1)):
            Circle(SKETCH_2_R_2)
    extrude(amount=-CUT_EXTRUDE_1_DEPTH, mode=Mode.SUBTRACT)


solid = part.part
